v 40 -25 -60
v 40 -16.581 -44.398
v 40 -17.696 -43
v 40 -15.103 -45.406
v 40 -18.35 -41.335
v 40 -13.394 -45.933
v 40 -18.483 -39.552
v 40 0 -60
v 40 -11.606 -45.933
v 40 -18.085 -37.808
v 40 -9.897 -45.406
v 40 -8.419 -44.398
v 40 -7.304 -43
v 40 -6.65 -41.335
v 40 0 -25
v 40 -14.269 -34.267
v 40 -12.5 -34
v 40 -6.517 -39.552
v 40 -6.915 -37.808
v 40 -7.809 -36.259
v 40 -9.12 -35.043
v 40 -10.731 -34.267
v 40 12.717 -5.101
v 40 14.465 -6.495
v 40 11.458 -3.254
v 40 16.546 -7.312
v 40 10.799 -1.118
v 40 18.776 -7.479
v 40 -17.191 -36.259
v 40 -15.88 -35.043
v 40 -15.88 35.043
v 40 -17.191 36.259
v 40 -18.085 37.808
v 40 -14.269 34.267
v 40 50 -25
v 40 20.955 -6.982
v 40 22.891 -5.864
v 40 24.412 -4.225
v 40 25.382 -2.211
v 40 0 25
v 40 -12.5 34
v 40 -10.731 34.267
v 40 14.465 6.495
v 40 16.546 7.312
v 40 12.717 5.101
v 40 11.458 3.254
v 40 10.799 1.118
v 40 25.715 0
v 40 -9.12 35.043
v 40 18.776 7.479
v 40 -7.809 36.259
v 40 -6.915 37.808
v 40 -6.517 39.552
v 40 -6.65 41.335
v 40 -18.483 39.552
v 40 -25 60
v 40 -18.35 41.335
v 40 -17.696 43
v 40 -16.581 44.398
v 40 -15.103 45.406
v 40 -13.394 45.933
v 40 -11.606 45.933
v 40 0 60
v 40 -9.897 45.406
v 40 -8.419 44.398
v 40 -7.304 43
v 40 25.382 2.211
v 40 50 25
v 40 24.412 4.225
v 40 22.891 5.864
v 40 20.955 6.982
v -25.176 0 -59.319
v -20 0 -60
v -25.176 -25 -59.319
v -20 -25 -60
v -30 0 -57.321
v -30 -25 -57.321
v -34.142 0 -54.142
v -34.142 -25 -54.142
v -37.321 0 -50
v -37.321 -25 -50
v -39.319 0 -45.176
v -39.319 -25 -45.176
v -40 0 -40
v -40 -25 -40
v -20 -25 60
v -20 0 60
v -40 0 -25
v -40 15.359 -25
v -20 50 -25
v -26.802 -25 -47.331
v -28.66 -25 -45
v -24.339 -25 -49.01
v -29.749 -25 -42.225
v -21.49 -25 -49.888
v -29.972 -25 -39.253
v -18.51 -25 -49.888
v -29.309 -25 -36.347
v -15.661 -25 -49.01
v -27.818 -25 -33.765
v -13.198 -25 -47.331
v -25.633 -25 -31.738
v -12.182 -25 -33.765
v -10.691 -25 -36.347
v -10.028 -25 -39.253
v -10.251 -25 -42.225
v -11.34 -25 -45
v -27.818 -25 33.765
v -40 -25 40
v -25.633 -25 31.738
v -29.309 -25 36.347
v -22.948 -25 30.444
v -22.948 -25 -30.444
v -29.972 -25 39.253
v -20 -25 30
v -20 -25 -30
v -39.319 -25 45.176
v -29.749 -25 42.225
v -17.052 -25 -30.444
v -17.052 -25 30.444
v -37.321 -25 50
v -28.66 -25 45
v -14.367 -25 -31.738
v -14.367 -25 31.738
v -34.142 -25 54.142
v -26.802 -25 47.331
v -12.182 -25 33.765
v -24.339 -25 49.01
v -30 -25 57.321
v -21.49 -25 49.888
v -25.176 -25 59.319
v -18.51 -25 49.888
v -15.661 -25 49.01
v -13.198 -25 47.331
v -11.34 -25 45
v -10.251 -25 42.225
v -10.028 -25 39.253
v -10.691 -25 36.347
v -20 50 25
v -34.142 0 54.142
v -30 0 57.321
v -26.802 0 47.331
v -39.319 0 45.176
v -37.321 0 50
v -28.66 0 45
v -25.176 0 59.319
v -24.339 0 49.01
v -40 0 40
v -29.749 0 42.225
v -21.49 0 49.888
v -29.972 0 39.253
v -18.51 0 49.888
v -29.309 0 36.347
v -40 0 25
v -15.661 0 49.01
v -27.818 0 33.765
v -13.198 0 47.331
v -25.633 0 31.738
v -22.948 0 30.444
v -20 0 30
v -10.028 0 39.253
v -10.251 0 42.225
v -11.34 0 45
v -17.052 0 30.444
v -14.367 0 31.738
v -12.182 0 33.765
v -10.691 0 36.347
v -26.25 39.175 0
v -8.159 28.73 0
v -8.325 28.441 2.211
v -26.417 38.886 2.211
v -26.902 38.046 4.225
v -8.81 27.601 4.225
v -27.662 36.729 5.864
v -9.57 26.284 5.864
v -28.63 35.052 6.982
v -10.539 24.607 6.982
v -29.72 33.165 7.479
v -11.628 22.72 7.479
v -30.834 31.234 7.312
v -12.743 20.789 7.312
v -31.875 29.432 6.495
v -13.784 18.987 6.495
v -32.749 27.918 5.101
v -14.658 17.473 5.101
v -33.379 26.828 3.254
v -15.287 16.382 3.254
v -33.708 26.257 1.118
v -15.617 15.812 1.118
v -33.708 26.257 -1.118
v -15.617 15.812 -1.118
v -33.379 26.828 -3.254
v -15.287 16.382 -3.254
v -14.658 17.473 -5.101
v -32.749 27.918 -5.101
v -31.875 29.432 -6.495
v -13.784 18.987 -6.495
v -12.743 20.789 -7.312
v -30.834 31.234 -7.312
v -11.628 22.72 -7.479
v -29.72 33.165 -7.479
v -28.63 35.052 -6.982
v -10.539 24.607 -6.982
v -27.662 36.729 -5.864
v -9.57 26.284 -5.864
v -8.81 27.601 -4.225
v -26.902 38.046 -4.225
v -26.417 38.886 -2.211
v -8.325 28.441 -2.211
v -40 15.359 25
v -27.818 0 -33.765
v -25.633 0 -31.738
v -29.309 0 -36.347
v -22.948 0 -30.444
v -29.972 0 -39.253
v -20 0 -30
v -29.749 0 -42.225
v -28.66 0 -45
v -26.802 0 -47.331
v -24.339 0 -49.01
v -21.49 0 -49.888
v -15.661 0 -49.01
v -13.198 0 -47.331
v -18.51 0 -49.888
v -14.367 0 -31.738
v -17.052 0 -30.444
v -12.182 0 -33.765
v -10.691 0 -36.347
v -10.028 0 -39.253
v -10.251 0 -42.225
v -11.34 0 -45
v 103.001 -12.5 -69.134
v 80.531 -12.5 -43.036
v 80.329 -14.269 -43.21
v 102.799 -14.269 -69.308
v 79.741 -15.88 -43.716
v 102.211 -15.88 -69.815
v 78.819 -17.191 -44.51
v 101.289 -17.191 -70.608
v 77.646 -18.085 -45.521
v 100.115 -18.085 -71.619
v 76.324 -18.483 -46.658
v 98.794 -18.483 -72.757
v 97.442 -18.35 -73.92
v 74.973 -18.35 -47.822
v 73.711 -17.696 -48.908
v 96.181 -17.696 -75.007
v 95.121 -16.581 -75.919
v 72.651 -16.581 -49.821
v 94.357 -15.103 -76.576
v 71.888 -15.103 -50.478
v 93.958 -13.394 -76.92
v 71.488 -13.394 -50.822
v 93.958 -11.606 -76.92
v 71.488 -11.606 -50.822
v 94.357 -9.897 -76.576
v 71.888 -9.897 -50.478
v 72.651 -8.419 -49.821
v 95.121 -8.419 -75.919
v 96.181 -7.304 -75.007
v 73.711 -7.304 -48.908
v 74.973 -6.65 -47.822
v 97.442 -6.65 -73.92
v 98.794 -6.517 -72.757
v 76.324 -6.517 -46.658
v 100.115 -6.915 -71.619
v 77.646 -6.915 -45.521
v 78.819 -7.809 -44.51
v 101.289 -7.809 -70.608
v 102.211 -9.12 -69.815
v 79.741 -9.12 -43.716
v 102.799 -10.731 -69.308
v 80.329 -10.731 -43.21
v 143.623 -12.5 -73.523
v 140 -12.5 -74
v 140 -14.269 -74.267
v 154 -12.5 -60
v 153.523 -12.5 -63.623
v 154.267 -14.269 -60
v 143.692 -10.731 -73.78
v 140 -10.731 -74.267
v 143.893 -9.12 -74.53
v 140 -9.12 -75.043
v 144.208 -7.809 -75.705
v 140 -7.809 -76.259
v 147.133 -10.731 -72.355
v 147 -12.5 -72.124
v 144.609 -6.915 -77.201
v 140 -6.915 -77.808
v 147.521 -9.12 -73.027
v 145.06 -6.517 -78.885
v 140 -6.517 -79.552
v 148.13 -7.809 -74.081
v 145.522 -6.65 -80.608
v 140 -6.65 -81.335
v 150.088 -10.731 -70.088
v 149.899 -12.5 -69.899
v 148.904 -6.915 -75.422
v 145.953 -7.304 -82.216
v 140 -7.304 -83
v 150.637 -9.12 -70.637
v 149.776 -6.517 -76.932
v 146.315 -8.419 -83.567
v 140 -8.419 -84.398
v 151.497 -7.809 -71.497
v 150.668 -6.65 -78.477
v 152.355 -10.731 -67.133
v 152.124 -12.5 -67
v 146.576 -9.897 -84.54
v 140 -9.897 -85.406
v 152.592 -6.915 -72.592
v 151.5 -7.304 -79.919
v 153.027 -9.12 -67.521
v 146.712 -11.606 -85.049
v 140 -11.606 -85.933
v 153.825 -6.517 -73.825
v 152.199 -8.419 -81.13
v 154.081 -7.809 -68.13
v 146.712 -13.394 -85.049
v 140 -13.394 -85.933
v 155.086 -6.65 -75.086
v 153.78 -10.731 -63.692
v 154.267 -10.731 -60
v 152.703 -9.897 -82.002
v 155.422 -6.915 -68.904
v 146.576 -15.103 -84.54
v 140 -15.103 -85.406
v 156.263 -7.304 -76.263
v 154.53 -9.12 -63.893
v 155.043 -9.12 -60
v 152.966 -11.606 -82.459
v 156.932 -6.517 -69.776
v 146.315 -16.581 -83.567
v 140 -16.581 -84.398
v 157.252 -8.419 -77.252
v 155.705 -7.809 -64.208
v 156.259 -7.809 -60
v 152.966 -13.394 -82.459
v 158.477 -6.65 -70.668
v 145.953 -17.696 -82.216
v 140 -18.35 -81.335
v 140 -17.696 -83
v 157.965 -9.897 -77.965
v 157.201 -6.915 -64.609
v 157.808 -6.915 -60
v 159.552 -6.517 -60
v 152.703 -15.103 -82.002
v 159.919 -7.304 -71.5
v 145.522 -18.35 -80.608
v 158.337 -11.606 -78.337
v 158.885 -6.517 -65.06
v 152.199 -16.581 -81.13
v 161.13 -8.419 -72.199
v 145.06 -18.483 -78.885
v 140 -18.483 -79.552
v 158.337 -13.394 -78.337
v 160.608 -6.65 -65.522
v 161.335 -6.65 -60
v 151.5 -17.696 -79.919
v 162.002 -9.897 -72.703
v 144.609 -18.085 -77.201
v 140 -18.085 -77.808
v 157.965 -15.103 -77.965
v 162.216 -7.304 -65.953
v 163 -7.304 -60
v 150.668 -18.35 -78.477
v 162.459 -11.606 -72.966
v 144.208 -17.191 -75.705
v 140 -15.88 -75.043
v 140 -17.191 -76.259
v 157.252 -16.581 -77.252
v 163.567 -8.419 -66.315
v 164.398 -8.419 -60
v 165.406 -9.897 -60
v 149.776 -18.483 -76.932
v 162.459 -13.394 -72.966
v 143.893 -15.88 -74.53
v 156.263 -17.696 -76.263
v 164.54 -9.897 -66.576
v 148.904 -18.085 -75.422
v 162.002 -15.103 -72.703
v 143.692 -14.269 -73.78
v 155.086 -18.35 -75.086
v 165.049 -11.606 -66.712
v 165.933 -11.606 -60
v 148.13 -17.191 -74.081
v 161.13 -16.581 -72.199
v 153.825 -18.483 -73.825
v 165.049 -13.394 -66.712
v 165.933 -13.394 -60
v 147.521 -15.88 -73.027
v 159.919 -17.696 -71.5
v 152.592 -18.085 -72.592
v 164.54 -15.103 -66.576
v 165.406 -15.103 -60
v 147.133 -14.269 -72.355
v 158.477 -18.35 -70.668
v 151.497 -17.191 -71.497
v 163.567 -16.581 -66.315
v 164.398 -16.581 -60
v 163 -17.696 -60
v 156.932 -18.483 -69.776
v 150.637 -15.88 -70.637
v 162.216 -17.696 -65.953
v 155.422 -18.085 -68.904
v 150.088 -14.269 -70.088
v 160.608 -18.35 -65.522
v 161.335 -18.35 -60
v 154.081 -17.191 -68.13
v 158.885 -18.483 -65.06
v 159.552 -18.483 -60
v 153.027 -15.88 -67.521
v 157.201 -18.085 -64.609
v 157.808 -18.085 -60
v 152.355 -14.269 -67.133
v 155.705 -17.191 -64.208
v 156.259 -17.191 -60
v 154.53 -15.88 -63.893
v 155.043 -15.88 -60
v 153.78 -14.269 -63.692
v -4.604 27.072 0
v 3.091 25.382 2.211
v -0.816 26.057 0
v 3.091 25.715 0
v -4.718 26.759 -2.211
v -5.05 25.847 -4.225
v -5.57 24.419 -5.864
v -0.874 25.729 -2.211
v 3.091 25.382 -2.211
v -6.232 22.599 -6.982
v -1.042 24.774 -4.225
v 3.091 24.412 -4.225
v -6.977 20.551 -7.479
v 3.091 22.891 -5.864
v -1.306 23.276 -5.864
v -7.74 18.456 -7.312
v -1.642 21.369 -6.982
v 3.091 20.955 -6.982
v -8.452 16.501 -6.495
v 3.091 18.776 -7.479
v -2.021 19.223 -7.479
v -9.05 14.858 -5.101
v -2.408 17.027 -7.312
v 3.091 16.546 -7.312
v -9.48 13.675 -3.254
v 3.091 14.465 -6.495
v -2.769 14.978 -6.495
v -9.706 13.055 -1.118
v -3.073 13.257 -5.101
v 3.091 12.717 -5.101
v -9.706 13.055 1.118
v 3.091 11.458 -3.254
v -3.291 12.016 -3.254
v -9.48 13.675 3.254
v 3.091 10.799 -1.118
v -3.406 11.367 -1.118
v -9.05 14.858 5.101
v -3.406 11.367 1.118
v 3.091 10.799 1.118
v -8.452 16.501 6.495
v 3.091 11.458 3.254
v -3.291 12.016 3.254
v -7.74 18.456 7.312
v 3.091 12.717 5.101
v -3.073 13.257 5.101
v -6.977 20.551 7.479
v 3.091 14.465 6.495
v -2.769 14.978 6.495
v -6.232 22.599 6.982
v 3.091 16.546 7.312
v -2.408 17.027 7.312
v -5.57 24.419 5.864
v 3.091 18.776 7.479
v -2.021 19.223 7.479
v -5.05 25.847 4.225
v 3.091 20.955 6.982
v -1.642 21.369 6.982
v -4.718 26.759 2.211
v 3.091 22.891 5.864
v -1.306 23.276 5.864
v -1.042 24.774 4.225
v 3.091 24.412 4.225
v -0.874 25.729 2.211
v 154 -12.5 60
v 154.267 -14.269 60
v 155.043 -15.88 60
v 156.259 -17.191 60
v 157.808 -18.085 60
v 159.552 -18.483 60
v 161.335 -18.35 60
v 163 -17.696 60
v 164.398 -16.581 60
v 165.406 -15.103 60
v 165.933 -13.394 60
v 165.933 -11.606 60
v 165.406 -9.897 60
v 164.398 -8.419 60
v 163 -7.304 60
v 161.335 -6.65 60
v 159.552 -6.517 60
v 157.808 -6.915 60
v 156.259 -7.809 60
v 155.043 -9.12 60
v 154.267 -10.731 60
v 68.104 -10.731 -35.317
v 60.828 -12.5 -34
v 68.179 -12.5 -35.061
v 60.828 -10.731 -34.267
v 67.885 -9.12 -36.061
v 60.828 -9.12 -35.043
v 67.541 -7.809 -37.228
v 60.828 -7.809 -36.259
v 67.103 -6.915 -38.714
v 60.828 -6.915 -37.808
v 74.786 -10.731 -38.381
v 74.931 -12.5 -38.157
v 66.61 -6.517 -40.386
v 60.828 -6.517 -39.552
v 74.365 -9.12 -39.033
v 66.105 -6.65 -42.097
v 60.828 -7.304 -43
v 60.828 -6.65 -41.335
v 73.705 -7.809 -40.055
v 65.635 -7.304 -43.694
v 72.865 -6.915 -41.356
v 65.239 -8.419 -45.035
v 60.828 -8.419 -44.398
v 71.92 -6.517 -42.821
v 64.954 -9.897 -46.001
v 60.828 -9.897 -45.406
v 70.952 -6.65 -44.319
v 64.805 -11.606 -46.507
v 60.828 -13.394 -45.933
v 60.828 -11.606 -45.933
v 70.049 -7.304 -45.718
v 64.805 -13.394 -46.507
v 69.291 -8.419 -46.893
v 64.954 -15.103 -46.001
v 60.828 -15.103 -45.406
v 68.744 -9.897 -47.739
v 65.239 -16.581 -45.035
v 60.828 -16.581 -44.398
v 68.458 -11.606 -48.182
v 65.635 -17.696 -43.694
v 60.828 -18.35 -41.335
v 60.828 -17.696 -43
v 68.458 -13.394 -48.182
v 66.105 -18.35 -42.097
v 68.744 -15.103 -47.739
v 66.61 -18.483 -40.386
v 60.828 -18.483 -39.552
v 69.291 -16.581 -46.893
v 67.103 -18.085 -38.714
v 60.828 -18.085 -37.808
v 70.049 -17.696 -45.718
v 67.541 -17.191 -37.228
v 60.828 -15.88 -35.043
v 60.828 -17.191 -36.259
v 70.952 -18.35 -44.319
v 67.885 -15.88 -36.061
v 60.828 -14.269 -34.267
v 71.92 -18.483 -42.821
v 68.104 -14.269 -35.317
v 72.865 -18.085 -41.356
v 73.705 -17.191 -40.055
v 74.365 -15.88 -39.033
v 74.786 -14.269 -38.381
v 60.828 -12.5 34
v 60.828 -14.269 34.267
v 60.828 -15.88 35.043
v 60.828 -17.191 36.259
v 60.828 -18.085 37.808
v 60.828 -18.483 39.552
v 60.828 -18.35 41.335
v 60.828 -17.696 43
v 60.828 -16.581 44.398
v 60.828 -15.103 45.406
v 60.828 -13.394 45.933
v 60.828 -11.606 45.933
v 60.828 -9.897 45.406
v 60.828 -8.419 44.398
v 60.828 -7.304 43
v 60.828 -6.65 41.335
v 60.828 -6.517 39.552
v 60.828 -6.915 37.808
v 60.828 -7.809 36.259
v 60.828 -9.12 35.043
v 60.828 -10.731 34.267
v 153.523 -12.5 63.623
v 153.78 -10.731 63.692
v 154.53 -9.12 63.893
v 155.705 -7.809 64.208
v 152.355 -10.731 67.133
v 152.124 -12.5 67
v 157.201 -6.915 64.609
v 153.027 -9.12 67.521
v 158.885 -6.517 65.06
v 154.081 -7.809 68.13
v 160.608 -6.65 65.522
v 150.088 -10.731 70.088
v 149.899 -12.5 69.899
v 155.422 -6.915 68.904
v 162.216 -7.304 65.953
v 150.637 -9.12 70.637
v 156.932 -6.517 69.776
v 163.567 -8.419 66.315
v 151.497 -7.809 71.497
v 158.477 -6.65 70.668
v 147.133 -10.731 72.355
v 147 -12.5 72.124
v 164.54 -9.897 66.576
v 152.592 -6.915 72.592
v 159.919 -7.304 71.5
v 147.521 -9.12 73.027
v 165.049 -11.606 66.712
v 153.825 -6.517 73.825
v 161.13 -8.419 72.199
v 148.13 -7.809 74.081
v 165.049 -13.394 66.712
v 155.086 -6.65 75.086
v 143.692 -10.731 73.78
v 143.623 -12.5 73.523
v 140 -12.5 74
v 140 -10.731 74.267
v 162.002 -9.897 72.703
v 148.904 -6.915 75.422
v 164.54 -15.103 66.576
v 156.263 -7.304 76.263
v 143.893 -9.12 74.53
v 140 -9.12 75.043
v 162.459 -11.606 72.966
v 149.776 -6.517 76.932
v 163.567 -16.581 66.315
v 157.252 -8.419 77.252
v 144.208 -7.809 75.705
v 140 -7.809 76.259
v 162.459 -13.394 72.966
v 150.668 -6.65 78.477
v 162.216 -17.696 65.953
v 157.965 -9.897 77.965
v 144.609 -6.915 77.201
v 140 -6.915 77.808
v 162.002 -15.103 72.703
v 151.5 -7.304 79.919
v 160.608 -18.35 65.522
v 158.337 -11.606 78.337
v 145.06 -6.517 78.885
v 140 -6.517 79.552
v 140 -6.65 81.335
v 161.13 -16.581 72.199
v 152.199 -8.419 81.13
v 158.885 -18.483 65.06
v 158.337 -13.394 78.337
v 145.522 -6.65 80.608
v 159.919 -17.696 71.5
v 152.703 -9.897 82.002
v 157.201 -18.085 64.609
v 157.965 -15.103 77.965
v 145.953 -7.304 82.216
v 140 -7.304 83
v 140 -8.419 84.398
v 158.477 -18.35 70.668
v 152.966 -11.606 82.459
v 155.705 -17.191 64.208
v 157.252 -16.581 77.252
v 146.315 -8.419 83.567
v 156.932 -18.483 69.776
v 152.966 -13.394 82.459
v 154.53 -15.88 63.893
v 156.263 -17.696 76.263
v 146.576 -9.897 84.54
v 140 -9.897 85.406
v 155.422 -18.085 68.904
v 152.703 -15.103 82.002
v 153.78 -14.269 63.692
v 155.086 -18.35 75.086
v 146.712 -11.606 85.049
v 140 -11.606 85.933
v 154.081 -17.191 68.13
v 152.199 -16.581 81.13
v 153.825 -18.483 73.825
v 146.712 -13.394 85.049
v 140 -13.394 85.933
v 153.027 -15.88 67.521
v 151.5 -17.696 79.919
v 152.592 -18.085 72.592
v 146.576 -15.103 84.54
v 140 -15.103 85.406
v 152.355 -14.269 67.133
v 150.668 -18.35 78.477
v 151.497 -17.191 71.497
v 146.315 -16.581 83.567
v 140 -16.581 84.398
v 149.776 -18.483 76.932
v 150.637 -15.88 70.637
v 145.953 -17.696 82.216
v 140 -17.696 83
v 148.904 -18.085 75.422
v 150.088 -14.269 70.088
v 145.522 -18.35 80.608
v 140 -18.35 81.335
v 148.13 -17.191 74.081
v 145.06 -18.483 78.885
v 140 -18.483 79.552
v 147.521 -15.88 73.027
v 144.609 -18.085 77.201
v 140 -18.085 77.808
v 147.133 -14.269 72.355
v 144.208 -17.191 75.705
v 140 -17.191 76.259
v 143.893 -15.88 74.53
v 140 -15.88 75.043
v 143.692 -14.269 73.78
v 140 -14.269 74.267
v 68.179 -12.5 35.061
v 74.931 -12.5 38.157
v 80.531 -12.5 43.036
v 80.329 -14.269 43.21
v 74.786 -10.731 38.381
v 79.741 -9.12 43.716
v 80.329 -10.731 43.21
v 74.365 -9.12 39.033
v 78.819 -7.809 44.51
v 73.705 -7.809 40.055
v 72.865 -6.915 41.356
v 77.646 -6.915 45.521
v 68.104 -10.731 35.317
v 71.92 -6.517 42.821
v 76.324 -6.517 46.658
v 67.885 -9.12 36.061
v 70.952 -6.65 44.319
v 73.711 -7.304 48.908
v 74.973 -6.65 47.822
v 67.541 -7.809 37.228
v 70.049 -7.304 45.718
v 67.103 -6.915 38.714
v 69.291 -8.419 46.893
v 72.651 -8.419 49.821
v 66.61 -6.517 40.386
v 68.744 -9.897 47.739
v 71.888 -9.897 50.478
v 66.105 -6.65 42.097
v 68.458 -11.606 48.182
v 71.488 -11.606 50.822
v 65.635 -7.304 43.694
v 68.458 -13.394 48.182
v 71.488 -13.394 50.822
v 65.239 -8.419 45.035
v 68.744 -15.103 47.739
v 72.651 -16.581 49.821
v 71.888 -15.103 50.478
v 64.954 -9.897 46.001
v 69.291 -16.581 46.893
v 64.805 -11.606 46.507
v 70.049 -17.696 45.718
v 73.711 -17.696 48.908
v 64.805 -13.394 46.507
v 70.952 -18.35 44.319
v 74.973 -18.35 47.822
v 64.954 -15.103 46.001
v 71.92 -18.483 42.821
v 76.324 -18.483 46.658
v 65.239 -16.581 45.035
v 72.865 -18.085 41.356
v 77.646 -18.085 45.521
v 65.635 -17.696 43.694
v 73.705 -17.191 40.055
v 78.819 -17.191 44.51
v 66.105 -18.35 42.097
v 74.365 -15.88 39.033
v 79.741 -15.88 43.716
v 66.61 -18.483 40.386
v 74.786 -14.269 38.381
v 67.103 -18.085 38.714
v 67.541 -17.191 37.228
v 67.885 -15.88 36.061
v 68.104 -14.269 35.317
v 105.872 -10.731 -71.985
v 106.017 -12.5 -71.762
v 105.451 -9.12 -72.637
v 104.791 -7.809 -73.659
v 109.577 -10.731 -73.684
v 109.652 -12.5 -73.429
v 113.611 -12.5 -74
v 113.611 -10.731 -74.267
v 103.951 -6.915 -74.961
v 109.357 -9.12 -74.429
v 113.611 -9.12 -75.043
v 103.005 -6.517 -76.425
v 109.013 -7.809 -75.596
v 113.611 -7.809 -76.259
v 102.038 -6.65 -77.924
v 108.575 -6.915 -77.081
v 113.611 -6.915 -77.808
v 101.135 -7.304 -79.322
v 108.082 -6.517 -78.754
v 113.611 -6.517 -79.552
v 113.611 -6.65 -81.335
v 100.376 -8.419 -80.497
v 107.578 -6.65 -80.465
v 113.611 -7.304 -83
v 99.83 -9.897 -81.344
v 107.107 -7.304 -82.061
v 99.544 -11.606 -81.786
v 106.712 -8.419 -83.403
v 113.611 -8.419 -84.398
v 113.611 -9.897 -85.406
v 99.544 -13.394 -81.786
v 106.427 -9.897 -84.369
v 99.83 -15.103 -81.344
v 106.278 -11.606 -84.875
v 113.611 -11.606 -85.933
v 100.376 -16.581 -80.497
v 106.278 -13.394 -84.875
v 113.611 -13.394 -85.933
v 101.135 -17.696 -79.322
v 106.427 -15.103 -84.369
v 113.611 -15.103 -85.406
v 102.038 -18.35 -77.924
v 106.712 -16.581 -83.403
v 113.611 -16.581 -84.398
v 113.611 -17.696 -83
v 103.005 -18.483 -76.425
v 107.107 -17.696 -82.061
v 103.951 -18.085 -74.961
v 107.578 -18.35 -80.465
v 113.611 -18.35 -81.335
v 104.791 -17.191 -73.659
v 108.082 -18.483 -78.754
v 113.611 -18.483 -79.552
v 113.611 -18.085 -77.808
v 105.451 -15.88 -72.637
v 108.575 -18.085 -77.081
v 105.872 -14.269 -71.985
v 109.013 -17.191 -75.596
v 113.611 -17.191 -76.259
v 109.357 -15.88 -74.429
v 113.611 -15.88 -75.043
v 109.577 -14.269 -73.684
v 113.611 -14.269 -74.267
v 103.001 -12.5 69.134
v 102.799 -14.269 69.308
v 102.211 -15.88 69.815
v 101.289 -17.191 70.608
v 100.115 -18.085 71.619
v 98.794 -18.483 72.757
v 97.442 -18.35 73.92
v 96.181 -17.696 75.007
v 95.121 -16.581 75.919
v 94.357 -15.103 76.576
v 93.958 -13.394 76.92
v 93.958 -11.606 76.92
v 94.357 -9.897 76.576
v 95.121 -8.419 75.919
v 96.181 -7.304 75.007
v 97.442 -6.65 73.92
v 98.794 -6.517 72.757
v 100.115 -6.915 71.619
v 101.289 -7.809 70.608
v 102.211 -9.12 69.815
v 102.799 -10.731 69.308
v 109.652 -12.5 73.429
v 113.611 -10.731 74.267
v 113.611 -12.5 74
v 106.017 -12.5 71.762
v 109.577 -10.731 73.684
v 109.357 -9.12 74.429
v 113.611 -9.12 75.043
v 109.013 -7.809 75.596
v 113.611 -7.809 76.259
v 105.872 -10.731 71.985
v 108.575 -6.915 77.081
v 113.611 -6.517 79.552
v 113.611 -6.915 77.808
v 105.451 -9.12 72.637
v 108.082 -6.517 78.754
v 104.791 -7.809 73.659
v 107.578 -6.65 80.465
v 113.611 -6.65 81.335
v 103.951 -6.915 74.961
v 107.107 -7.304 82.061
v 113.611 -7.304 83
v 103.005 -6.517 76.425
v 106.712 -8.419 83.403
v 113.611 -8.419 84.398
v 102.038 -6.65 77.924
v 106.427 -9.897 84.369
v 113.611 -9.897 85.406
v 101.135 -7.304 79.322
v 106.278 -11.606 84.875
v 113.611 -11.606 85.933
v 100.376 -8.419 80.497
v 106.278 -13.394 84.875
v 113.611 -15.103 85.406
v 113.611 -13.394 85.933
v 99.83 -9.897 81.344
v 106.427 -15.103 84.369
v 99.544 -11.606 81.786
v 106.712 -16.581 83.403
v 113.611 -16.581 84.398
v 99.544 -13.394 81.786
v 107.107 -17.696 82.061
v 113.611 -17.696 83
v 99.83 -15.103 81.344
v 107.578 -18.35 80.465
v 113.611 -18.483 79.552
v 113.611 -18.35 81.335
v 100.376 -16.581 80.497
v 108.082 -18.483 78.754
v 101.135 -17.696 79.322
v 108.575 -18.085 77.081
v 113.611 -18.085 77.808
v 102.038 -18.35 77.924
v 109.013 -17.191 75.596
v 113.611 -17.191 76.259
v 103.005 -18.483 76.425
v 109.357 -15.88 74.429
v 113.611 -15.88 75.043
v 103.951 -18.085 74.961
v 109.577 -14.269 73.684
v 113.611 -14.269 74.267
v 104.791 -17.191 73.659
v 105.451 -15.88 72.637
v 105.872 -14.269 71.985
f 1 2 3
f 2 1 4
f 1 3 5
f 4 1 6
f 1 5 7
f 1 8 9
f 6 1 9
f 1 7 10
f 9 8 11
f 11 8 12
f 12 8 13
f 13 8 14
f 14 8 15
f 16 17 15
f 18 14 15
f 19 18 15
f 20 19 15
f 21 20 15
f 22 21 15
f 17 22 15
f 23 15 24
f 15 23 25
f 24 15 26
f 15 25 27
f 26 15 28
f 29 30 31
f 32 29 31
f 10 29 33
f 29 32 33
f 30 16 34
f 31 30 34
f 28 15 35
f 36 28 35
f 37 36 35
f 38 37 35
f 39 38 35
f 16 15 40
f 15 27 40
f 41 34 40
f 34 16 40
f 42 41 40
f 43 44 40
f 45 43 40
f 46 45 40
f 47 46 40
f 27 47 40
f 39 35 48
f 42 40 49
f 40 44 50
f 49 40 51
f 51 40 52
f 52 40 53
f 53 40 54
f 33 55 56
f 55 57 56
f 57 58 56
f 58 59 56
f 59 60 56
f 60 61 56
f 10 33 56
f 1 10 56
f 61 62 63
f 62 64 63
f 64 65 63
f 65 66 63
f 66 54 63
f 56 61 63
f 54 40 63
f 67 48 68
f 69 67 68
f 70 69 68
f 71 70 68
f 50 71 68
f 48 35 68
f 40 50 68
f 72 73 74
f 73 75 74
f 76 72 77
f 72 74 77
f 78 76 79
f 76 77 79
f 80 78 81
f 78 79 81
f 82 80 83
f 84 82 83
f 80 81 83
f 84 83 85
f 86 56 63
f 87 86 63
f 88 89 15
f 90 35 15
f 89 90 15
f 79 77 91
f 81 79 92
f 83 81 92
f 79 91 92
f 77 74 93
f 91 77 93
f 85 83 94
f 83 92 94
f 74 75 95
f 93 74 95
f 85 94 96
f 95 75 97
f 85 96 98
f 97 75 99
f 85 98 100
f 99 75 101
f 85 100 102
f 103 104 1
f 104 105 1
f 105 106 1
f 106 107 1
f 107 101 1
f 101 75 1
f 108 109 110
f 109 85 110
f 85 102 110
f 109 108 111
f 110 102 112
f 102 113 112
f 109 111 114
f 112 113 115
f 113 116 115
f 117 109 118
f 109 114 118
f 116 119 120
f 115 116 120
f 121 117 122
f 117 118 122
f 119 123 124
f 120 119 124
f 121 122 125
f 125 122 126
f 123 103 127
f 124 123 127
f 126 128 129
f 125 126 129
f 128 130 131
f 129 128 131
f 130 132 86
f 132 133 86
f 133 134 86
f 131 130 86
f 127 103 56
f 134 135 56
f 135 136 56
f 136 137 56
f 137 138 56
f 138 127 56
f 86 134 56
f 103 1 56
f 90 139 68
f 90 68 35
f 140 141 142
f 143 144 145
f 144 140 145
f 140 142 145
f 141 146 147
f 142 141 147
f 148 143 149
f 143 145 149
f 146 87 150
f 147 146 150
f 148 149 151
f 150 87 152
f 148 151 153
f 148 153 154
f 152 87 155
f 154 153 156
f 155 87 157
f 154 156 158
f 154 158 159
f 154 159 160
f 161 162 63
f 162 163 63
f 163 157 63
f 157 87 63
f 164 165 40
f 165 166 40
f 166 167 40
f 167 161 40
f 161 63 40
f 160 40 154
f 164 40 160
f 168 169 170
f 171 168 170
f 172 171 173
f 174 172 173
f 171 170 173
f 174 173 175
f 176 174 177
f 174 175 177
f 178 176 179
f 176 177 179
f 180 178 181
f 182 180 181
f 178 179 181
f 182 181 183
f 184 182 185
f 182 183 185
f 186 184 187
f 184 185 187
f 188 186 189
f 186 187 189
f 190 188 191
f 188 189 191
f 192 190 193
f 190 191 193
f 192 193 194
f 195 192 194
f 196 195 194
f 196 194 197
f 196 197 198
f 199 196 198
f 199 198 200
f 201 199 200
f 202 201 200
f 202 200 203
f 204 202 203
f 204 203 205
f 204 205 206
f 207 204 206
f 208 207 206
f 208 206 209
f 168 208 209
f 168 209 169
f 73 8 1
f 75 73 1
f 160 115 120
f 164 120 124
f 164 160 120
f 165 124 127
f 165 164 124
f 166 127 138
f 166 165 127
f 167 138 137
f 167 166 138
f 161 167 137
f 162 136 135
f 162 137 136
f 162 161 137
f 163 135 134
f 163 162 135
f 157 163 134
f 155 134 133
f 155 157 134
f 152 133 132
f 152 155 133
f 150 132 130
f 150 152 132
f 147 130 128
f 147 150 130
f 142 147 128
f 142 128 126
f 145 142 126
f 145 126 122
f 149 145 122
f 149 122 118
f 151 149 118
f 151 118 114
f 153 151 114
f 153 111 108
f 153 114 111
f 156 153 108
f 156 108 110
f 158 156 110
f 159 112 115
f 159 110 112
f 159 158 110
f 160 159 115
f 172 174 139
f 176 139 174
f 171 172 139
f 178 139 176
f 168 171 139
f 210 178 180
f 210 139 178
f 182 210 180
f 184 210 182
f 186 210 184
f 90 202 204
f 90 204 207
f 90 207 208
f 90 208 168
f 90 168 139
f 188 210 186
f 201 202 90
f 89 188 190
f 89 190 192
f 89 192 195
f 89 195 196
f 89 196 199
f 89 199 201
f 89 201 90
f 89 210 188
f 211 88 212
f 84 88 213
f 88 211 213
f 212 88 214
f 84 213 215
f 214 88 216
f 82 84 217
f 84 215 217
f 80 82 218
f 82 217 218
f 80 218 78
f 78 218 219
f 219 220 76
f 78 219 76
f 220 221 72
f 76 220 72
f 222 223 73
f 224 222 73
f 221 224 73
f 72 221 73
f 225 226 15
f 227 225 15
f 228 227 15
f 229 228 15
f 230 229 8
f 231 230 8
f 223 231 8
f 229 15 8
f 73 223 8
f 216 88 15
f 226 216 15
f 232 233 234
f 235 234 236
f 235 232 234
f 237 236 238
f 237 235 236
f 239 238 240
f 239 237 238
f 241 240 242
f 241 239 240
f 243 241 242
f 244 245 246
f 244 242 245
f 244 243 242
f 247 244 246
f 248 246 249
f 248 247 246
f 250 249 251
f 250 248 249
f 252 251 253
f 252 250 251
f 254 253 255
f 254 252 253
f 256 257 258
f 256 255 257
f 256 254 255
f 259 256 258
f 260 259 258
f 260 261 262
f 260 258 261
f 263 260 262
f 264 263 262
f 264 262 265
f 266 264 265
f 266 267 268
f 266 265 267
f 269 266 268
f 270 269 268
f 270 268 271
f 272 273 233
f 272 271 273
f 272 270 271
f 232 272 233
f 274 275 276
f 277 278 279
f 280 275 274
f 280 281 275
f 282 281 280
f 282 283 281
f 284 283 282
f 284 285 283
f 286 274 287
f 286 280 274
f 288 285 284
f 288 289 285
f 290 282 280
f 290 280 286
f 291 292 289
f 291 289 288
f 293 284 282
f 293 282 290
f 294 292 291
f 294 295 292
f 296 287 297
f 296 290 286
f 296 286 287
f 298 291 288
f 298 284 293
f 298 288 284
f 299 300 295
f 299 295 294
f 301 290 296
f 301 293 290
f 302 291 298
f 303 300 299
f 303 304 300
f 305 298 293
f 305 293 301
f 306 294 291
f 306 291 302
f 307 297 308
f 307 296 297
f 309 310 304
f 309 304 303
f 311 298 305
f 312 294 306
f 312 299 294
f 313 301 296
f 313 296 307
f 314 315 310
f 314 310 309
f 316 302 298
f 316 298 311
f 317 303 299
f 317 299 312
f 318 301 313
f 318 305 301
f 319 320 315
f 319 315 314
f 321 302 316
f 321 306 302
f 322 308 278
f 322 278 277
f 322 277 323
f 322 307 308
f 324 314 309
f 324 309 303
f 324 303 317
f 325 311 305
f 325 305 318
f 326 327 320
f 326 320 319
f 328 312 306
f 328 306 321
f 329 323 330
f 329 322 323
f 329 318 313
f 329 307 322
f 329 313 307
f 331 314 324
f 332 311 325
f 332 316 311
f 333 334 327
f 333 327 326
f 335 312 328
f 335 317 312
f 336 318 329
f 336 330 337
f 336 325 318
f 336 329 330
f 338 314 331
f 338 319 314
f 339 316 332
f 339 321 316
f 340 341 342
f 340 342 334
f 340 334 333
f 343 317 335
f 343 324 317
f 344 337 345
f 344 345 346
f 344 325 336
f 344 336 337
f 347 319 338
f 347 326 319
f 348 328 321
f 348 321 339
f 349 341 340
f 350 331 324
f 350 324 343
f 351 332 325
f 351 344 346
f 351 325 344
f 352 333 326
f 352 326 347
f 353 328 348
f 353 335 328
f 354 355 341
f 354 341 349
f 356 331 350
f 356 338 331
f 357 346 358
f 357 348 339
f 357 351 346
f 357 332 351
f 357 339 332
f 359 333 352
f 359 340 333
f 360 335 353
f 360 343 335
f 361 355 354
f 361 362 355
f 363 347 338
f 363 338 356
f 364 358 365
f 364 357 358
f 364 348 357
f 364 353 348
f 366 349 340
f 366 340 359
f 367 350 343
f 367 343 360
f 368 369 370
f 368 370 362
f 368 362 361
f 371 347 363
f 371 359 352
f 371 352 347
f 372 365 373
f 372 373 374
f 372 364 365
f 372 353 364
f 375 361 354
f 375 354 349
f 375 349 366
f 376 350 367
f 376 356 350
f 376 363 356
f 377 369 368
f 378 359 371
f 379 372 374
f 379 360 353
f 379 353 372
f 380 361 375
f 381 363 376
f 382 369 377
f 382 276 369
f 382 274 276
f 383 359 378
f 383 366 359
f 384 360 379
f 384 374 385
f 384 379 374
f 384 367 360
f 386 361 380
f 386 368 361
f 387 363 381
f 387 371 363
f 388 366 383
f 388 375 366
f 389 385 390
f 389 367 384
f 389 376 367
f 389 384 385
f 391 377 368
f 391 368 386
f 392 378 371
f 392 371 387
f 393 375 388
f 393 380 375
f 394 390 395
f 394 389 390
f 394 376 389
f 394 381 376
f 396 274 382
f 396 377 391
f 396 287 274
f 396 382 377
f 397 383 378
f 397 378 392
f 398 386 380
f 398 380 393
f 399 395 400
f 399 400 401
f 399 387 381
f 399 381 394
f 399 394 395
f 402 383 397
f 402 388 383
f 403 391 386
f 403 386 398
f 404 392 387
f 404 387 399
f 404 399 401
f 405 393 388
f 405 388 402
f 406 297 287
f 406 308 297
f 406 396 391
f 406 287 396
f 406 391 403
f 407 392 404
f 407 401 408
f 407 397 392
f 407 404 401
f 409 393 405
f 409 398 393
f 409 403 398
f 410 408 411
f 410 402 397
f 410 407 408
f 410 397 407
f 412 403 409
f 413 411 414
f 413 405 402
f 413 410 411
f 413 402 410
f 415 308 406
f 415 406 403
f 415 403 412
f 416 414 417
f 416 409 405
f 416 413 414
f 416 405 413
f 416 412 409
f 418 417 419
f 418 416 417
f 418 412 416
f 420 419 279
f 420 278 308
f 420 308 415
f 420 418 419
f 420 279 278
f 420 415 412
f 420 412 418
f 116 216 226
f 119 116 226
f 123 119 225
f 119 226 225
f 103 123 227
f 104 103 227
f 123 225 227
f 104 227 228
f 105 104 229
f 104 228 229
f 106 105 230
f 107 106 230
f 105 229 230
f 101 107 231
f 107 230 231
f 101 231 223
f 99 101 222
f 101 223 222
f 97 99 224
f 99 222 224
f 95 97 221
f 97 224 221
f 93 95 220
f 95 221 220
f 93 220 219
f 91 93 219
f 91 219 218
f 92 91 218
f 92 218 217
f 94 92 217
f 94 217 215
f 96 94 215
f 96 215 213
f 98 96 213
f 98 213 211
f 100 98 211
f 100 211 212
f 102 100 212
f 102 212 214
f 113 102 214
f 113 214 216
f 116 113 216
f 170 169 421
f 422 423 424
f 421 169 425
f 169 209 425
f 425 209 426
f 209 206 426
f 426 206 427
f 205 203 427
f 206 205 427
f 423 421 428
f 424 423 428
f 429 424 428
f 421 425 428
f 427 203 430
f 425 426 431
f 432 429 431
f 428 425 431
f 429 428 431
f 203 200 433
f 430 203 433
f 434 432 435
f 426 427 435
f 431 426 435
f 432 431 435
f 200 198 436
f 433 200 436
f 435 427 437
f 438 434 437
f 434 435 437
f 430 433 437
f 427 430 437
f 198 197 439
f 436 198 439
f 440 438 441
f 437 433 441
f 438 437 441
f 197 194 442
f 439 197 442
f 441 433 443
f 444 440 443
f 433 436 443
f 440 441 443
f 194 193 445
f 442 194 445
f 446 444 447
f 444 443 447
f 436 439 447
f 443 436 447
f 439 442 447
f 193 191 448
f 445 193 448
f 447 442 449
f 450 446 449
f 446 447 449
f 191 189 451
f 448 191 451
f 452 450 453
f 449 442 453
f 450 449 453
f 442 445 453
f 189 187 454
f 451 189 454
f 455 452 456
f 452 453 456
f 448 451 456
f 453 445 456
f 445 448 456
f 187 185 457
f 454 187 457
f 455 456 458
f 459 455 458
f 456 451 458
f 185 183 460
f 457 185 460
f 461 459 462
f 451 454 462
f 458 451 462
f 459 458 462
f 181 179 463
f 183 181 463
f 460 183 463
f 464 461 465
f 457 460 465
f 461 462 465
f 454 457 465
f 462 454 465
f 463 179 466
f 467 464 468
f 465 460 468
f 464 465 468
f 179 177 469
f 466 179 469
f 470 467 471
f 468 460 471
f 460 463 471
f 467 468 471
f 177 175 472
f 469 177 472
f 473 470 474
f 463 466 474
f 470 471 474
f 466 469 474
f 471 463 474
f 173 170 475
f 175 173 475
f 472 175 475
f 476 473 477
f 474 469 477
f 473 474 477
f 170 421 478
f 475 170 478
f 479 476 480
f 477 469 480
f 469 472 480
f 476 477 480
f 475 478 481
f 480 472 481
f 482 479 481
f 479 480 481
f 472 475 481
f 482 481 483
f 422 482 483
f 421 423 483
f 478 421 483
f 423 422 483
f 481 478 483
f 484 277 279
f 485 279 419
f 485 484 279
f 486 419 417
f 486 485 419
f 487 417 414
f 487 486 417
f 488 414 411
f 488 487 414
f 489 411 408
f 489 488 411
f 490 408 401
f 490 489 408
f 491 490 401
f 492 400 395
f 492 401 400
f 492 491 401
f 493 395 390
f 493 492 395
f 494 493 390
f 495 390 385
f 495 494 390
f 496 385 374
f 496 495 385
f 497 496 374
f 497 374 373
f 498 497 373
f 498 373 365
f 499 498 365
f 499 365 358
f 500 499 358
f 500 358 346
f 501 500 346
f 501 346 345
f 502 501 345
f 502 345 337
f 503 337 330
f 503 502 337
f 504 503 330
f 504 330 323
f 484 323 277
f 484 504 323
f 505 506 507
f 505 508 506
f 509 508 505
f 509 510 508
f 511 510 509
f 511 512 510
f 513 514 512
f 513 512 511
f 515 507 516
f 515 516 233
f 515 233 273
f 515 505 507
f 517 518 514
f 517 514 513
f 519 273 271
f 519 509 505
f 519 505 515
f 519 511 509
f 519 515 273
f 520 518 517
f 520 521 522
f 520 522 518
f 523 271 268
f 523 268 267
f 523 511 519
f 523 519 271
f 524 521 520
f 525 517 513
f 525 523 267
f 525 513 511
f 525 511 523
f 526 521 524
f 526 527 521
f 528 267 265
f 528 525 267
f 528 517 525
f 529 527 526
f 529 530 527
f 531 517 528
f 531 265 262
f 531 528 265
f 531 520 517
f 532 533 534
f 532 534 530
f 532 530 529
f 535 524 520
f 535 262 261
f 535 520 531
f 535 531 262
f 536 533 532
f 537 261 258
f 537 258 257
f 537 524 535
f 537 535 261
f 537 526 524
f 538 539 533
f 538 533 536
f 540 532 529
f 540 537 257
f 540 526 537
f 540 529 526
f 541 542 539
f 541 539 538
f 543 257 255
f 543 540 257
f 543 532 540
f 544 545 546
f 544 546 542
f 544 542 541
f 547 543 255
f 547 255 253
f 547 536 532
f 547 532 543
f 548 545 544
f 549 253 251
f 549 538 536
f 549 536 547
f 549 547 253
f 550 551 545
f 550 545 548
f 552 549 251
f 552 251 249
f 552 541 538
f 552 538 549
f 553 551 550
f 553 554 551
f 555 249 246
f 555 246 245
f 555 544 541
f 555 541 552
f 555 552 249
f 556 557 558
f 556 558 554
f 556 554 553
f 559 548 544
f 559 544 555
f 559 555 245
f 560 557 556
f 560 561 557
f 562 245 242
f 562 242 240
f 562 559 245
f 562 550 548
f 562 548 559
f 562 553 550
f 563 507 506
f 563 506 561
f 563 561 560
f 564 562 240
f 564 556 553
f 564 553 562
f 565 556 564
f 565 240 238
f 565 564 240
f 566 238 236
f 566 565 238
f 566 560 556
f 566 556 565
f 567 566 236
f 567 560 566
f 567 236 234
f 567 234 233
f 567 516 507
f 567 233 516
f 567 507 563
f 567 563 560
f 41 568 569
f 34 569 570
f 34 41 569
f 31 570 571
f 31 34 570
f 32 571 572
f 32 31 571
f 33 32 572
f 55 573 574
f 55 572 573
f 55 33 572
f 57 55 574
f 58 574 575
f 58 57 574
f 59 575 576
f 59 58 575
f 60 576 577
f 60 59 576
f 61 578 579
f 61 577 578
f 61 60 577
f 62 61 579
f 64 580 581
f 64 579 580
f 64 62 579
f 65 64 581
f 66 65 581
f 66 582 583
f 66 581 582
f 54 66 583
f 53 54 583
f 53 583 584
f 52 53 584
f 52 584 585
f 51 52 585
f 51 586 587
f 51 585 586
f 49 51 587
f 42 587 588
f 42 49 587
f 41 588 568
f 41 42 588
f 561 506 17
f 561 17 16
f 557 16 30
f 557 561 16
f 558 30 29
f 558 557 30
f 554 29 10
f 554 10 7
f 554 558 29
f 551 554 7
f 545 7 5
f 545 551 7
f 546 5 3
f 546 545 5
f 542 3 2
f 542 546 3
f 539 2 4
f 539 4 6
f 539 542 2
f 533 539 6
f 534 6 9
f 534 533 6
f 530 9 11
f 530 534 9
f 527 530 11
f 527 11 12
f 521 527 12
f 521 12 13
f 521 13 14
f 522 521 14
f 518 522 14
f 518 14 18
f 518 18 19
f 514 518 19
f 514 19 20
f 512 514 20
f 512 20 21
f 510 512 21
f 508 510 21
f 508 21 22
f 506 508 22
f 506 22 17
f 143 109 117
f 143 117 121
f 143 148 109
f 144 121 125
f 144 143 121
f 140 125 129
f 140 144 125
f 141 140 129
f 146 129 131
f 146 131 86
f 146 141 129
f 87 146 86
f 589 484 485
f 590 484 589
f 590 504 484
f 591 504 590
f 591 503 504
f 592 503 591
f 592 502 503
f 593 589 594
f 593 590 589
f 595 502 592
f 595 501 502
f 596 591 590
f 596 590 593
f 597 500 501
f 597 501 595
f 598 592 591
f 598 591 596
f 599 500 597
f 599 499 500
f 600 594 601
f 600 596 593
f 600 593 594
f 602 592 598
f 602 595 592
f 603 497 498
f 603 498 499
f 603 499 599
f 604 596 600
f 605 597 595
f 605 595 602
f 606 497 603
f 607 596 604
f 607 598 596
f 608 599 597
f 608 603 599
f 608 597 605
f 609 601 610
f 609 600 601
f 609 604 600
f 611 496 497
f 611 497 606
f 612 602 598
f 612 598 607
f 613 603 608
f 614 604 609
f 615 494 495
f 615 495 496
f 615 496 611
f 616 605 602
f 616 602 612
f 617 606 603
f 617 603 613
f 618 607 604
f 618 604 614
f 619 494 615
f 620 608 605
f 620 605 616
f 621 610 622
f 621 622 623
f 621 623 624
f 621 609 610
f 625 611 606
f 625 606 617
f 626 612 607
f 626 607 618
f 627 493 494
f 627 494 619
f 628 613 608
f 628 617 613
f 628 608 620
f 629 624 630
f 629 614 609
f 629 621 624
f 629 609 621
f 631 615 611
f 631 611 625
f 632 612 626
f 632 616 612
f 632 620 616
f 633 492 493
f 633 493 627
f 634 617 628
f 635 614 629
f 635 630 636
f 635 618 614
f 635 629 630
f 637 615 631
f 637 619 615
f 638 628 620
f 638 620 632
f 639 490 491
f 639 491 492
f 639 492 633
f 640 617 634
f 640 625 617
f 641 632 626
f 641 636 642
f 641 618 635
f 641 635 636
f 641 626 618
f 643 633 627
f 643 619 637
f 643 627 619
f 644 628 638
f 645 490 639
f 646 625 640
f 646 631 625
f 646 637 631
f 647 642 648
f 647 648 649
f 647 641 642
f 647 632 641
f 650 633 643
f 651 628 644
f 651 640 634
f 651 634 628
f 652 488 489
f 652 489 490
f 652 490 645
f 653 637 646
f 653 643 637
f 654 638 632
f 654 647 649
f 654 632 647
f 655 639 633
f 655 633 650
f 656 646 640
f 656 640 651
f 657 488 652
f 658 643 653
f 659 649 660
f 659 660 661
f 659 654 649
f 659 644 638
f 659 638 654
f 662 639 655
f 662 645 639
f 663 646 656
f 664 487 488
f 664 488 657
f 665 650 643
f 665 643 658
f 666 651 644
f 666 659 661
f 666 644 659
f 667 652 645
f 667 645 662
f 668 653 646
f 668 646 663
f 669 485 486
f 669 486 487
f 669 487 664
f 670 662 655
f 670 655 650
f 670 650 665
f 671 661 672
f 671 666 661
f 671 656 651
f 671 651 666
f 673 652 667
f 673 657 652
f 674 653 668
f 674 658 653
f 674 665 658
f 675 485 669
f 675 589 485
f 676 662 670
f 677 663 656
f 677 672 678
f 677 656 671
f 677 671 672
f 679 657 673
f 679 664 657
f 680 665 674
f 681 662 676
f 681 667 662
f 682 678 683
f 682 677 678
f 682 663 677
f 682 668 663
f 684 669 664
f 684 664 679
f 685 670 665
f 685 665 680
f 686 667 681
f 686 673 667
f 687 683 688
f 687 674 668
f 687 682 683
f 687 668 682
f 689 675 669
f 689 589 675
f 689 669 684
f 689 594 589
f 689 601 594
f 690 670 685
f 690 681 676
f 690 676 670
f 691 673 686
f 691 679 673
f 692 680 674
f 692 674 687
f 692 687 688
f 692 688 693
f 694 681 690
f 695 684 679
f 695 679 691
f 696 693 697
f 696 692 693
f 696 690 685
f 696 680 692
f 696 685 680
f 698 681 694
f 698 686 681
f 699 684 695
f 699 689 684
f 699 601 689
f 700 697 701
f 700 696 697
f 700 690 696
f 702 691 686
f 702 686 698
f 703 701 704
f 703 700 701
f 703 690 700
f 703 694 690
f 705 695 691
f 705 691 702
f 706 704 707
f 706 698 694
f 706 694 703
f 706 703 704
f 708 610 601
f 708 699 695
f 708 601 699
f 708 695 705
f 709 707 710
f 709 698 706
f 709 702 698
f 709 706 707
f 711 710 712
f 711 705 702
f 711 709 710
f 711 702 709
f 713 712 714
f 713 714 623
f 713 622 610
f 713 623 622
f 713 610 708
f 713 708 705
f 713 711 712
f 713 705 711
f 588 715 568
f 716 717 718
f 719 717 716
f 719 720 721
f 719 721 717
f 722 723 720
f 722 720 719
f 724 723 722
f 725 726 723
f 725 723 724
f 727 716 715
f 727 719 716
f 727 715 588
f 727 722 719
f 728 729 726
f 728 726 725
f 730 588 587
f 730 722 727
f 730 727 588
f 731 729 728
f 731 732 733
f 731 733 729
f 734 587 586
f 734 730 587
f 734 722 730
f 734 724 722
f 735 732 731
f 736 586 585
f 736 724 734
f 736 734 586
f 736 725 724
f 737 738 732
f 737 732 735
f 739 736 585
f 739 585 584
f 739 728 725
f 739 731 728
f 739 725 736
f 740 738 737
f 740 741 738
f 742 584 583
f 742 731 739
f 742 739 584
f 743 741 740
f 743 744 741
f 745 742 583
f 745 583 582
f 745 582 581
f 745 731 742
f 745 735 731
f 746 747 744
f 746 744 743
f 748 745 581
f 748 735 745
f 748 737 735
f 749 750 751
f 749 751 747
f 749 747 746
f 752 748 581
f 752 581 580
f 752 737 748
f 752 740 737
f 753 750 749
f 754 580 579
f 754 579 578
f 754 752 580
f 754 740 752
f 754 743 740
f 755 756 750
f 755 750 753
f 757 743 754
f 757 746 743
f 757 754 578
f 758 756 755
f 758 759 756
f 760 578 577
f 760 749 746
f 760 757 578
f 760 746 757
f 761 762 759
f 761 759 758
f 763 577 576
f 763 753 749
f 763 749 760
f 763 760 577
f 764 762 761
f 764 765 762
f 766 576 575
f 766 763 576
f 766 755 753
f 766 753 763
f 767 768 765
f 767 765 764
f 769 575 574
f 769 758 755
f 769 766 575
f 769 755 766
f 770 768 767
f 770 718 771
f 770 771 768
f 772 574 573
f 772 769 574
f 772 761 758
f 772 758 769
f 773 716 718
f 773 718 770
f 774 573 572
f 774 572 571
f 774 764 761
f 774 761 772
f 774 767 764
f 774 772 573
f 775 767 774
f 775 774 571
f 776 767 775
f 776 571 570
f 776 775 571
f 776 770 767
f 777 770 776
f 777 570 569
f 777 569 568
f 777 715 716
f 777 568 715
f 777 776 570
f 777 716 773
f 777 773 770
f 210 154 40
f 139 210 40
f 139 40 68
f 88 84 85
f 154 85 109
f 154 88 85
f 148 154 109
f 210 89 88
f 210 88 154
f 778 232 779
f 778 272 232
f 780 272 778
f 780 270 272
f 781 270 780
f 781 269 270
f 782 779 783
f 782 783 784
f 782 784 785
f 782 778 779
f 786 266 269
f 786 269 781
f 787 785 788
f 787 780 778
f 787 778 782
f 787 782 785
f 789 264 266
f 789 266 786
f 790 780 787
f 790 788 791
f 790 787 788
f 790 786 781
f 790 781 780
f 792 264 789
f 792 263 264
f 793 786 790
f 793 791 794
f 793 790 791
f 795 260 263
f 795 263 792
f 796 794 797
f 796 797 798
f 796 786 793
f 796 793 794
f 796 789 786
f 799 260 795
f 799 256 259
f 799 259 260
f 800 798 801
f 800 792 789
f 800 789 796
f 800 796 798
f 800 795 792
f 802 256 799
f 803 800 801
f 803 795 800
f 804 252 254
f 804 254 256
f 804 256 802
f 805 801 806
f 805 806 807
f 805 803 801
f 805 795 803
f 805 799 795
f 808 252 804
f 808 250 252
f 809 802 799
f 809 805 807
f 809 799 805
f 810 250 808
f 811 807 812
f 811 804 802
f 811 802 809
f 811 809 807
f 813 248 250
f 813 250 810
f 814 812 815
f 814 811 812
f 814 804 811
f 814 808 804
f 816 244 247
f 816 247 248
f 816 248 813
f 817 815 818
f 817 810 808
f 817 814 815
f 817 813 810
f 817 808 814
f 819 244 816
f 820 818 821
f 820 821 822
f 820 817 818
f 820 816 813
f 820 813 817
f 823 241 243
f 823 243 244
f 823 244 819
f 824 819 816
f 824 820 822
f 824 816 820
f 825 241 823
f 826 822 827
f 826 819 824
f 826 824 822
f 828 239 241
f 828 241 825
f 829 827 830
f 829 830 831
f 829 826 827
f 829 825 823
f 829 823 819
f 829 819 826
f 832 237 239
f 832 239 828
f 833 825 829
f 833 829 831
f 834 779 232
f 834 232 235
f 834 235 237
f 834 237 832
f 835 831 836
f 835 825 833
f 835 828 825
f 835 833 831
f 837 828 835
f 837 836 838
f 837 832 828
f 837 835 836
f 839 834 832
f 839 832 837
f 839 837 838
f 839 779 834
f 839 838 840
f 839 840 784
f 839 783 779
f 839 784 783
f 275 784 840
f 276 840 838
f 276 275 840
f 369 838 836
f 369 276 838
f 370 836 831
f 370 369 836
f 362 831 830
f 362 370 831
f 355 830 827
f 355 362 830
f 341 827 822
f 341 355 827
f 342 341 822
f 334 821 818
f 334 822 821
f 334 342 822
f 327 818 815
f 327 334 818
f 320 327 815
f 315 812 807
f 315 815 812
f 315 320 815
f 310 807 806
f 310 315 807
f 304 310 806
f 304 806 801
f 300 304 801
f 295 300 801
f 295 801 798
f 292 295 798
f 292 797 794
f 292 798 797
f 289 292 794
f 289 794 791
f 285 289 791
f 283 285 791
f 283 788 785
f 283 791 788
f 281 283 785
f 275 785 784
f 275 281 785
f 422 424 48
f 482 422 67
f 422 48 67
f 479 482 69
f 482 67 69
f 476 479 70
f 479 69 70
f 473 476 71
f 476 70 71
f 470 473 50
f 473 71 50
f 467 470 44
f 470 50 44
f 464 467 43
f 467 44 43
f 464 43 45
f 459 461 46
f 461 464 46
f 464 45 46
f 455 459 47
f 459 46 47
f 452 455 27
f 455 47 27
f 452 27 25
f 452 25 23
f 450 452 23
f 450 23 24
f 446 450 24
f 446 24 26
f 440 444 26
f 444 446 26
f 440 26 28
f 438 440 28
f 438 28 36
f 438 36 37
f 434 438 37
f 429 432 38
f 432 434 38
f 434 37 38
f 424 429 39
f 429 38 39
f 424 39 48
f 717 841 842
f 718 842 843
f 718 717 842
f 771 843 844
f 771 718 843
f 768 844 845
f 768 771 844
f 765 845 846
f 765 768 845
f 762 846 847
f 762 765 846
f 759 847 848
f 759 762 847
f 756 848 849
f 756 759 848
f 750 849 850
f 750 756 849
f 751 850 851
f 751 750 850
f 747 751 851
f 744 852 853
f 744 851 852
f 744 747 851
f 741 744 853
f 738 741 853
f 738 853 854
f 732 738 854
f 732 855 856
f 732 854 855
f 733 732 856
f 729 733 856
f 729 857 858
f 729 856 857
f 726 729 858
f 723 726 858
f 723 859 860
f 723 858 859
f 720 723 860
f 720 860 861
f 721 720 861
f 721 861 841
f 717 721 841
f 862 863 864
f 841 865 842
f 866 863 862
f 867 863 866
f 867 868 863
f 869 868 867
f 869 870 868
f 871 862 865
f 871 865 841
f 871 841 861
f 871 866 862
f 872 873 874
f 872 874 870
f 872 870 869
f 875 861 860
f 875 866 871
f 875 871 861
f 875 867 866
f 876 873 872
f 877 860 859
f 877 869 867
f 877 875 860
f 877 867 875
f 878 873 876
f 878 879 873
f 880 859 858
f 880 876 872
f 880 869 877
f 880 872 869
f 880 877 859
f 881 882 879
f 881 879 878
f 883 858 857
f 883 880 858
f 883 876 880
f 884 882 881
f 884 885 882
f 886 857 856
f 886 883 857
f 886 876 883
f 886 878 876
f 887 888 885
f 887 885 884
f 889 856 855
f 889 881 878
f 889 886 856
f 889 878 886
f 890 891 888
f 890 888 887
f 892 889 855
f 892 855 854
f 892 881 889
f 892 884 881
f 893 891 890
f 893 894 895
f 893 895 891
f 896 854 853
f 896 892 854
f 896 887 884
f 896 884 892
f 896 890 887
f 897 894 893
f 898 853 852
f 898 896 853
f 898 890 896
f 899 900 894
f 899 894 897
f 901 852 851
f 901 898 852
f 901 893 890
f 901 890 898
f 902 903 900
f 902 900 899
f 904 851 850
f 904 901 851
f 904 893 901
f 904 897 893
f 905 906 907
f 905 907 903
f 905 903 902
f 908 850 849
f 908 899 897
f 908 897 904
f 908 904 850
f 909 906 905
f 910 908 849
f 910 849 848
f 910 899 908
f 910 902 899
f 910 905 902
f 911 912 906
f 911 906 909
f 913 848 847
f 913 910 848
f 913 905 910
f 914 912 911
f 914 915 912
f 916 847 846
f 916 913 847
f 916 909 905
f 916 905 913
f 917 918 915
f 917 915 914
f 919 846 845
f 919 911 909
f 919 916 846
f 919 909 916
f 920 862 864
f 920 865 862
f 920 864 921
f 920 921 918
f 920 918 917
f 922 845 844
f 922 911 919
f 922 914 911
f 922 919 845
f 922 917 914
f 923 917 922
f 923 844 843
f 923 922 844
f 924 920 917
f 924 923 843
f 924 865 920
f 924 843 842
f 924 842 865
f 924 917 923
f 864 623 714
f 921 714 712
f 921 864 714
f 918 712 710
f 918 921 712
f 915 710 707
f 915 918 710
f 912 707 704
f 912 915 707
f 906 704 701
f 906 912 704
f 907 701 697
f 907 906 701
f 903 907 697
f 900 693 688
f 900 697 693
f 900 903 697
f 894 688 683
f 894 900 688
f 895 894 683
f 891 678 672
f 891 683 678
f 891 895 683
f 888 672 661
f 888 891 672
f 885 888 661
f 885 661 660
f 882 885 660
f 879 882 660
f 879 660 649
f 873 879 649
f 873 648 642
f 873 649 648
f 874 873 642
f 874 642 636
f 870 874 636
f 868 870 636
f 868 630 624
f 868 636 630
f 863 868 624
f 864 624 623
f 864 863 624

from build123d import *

# Parameters (mm, degrees)
EXTRUDE_3_DEPTH     = 40
FILLET_1_R          = 20
SKETCH_17_R         = 10
CUT_EXTRUDE_2_DEPTH = 88.749643874
CHAMFER_1_SIZE      = 20
CHAMFER_1_SIZE2     = 34.641016151
SWEEP_2_PROFILE_R   = 7.5
SWEEP_2_2_PROFILE_R = 6


with BuildPart() as part:
    # 草图15 → 凸台-拉伸3 (new, symmetric)
    with BuildSketch(Plane(origin=(0, 0, 0), x_dir=(0, 0, -1), z_dir=(1, 0, 0))):
        Polygon((-60, 0), (-25, 0), (-25, 50), (25, 50), (25, 0), (60, 0), (60, -25), (-60, -25), align=None)
    extrude(amount=EXTRUDE_3_DEPTH, both=True)

    # 圆角1
    fillet_1_edges = [part.edges().sort_by_distance(p)[0] for p in [
        (-40, -12.5, -60),
        (-40, -12.5, 60),
    ]]
    fillet(fillet_1_edges, radius=FILLET_1_R)

    # 草图17 → 切除-拉伸2 (cut, through all)
    with BuildSketch(Plane(origin=(0, 0, 0), x_dir=(1, 0, 0), z_dir=(0, 1, 0))):
        with Locations(Location((-20, 40, 0), (0, 0, 270))):
            Circle(SKETCH_17_R)
    cut_extrude_2 = extrude(amount=-CUT_EXTRUDE_2_DEPTH, mode=Mode.SUBTRACT)

    # 镜向1: 切除-拉伸2 across plane
    add(cut_extrude_2.mirror(Plane.XY), mode=Mode.SUBTRACT)

    # 倒角1
    chamfer_1_edges = [part.edges().sort_by_distance(p)[0] for p in [
        (-40, 50, 0),
    ]]
    chamfer_1_side = [part.faces().sort_by_distance(p)[0] for p in [
        (0, 50, 0),
    ]]
    chamfer(chamfer_1_edges, length=CHAMFER_1_SIZE, length2=CHAMFER_1_SIZE2, reference=chamfer_1_side[0])

    # Sweep 2: sweep along a path in 草图19
    with BuildLine(Plane.XY) as sweep_2_path:
        Line((-30, 32.679491924), (-11.908563538, 22.234396213))
        ThreePointArc((-11.908563538, 22.234396213), (-4.673134891, 19.237383538), (3.091436462, 18.215158327))
        Line((3.091436462, 18.215158327), (40, 18.215158327))
    # Sweep 2 profile (on start of the path) → Sweep 2 (sweep, cut)
    with BuildSketch(Plane(origin=(-30, 32.679491924, 0), x_dir=(0.500000000000001, 0.866025403784438, 0), z_dir=(0.866025403784438, -0.500000000000001, 0))):
        Circle(SWEEP_2_PROFILE_R)
    sweep(path=sweep_2_path.line, mode=Mode.SUBTRACT)

    # Sweep 2 2: sweep along a path in 草图26
    with BuildLine(Plane(origin=(0, -12.5, 0), x_dir=(1, 0, 0), z_dir=(0, 1, 0))) as sweep_2_2_path:
        Line((40, 40), (60.827915323, 40))
        ThreePointArc((60.827915323, 40), (69.165079187, 41.820569352), (75.984404551, 46.95083013))
        Line((75.984404551, 46.95083013), (98.454098123, 73.04916987))
        ThreePointArc((98.454098123, 73.04916987), (105.273423486, 78.179430648), (113.610587351, 80))
        Line((113.610587351, 80), (140, 80))
        ThreePointArc((140, 80), (154.142135624, 74.142135624), (160, 60))
        Line((160, 60), (160, -60))
        ThreePointArc((160, -60), (154.142135624, -74.142135624), (140, -80))
        Line((140, -80), (113.610587351, -80))
        ThreePointArc((113.610587351, -80), (105.273423486, -78.179430648), (98.454098123, -73.04916987))
        Line((98.454098123, -73.04916987), (75.984404551, -46.95083013))
        ThreePointArc((75.984404551, -46.95083013), (69.165079187, -41.820569352), (60.827915323, -40))
        Line((60.827915323, -40), (40, -40))
    # Sweep 2 2 profile (on start of the path) → Sweep 2 2 (sweep)
    with BuildSketch(Plane(origin=(40, -12.5, -40), x_dir=(0, 0, 1), z_dir=(1, 0, 0))):
        Circle(SWEEP_2_2_PROFILE_R)
    sweep(path=sweep_2_2_path.line)


solid = part.part
